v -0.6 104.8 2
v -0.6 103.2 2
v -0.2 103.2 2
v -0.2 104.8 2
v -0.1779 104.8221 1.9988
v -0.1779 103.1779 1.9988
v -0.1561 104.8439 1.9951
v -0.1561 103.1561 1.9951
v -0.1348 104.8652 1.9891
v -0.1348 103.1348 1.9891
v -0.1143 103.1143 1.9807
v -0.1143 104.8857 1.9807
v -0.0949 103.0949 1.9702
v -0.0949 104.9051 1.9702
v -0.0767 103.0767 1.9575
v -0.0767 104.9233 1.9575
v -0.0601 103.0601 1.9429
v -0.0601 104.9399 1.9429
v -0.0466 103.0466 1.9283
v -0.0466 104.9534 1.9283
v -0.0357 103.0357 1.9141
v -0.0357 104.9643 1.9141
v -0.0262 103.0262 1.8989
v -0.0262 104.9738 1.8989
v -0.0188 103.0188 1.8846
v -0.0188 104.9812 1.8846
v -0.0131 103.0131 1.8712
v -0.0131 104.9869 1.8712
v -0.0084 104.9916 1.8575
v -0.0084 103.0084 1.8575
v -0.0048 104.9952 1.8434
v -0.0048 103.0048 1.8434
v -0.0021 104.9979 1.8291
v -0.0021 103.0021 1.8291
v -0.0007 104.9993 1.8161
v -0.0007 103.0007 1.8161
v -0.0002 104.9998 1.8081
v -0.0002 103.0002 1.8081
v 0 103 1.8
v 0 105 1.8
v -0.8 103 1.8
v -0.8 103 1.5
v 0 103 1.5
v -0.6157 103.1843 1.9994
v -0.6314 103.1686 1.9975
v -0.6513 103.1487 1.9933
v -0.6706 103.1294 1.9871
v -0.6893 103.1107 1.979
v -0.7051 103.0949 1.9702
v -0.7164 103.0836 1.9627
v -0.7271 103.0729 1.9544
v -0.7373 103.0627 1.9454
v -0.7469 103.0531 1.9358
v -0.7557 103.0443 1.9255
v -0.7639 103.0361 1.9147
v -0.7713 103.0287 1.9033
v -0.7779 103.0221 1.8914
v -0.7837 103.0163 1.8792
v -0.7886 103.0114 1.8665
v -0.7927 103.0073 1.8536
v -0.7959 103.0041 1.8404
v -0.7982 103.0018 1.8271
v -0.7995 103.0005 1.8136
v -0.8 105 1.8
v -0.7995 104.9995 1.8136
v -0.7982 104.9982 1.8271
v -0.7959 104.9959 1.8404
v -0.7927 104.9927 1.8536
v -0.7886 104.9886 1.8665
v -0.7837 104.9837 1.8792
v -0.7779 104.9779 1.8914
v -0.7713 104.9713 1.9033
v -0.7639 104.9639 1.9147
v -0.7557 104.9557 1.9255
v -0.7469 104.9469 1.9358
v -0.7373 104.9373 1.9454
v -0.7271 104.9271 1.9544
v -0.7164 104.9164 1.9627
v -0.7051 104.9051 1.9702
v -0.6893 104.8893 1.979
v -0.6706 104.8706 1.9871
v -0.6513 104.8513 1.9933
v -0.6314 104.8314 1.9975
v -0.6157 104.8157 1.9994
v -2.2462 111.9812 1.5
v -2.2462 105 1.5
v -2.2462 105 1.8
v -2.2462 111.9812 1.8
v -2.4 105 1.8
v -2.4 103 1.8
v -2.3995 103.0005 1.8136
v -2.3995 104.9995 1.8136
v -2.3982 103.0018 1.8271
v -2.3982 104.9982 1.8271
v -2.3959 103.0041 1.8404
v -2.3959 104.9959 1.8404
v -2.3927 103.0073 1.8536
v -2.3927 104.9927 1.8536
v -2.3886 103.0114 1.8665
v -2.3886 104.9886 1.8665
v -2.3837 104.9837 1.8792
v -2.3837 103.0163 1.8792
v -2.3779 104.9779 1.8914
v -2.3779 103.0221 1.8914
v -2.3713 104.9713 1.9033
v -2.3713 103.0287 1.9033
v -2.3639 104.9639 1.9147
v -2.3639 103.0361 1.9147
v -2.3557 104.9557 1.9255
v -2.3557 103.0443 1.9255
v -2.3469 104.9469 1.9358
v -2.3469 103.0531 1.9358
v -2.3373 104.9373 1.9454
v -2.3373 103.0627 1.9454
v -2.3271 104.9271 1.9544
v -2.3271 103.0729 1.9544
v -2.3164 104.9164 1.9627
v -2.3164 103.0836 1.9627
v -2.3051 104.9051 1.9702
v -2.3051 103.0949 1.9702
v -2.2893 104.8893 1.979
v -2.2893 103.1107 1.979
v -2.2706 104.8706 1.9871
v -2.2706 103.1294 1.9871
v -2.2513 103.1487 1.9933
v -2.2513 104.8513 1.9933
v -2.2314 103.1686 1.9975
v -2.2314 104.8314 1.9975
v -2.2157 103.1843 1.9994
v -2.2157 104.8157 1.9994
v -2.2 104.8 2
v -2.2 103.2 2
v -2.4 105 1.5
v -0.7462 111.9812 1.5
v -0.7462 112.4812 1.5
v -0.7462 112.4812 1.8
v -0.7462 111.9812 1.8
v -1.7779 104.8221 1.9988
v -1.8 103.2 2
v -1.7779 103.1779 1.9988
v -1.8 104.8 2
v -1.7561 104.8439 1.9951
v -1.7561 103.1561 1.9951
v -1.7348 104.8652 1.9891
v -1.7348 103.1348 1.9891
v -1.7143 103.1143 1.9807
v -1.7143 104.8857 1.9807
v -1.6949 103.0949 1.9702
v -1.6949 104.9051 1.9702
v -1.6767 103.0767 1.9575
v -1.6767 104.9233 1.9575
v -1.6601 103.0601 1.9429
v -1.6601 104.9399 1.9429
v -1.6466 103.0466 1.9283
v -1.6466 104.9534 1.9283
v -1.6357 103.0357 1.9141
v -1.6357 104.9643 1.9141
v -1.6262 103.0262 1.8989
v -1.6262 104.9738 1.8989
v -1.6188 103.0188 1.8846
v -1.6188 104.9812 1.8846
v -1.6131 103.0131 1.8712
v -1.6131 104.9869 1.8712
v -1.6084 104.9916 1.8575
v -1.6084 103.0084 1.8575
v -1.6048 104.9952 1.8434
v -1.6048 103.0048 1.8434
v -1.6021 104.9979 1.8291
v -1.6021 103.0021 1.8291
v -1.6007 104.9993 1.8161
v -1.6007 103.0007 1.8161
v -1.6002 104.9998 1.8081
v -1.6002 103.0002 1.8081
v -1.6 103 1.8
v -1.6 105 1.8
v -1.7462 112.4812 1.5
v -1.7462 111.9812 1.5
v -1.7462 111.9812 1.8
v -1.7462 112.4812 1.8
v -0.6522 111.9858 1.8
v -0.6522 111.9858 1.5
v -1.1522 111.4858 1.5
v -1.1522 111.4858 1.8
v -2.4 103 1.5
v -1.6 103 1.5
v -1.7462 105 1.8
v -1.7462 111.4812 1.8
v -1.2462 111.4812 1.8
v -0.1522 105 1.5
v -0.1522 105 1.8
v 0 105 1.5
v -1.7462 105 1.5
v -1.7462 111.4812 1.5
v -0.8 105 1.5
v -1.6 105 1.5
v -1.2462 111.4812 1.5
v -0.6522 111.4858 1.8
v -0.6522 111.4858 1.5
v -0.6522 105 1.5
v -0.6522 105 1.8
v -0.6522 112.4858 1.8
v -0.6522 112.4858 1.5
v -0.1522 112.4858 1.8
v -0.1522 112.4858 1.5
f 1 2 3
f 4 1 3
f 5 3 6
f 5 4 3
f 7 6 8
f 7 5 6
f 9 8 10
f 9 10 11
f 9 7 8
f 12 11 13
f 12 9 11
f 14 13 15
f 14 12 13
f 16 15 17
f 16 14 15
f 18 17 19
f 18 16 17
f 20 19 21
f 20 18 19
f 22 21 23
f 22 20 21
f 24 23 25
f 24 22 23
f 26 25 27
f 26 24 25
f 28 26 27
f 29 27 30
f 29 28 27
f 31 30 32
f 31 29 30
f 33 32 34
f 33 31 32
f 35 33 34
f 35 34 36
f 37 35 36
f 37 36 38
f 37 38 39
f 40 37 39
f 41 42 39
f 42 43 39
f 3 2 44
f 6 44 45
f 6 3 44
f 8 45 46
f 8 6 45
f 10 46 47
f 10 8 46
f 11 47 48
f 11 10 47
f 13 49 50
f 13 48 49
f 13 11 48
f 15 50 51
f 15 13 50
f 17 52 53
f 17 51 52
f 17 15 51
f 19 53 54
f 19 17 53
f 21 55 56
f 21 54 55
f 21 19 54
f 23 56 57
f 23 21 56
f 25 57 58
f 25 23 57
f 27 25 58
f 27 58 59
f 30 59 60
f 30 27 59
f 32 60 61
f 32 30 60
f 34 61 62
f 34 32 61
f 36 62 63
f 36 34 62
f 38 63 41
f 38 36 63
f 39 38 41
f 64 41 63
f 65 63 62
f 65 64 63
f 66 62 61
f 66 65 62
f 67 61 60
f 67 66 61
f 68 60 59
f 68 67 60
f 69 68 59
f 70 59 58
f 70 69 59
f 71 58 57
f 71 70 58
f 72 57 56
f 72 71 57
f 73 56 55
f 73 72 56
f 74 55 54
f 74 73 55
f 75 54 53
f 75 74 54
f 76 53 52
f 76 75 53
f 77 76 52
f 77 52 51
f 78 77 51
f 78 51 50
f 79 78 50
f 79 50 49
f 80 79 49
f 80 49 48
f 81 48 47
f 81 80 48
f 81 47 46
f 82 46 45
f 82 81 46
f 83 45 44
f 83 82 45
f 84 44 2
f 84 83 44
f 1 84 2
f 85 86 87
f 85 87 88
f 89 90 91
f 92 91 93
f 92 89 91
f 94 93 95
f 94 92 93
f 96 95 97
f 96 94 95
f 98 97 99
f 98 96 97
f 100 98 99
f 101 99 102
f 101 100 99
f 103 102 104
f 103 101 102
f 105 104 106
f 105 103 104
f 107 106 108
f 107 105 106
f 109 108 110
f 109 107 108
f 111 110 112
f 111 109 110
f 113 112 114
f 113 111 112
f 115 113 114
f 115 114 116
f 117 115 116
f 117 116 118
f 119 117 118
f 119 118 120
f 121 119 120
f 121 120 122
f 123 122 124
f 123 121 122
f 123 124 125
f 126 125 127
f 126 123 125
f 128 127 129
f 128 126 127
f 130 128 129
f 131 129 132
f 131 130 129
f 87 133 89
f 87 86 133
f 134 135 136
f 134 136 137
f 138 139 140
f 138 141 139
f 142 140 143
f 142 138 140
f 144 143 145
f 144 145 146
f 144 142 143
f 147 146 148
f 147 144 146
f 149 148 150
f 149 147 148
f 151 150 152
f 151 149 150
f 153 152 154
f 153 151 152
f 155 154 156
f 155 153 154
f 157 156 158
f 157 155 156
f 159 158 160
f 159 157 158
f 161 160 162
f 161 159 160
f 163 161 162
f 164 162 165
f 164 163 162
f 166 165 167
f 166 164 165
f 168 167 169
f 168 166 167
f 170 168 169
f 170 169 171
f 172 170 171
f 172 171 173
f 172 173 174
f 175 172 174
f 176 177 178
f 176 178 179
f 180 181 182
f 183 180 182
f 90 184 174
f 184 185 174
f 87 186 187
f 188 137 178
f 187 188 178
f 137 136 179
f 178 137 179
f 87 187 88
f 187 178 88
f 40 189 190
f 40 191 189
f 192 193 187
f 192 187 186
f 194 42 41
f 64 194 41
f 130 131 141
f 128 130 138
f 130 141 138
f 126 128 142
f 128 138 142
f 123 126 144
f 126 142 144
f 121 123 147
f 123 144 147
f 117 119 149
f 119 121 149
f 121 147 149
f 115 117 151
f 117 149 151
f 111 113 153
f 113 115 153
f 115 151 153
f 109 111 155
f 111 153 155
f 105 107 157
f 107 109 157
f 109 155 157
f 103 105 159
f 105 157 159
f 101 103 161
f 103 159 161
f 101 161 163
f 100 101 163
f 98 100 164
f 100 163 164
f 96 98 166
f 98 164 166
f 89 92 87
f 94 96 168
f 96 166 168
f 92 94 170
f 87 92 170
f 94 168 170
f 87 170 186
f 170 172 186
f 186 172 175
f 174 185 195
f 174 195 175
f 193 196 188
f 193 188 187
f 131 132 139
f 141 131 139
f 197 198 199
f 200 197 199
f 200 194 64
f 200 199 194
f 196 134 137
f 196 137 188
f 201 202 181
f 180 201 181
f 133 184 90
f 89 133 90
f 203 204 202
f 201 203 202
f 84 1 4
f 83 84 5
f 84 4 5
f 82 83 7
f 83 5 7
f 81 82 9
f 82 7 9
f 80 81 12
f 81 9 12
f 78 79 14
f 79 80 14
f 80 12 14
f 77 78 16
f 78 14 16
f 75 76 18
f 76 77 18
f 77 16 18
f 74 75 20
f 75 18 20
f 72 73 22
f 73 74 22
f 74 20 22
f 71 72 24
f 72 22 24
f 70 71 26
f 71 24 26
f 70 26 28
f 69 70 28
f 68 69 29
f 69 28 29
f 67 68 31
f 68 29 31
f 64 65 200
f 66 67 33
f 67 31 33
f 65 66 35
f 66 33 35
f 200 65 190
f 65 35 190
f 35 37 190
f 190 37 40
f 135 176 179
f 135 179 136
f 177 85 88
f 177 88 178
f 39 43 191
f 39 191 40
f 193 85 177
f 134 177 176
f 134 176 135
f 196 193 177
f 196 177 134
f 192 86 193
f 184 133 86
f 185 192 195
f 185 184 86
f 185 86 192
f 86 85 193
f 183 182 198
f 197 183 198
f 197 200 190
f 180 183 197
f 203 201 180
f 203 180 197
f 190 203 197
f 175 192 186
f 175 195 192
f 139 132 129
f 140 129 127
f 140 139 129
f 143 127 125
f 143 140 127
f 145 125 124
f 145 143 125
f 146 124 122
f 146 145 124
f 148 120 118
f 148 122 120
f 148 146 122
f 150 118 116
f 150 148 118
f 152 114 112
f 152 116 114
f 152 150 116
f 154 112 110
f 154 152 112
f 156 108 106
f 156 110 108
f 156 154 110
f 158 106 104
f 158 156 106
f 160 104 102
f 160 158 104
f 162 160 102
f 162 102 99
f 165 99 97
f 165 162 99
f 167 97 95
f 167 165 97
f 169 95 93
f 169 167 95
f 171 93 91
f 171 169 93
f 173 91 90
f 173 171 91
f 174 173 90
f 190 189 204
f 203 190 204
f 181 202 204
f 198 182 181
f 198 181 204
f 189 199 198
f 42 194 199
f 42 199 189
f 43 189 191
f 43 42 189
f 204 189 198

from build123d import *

# Parameters (mm, degrees)
BOX002_W                  = 0.5
BOX002_H                  = 0.8
BOX002_DEPTH              = 2
FILLET001_R               = 0.2
FILLET001_PITCH_ANGLE     = -90
FILLET001_PLACEMENT_ANGLE = -90
PAD003_DEPTH              = 0.3
PAD002_DEPTH              = 0.3
FUSION001_PITCH_ANGLE     = -90
FUSION001_PLACEMENT_ANGLE = -90
BOX003_W                  = 0.5
BOX003_H                  = 0.8
BOX003_DEPTH              = 2
FILLET002_R               = 0.2
FILLET002_PITCH_ANGLE     = -90
FILLET002_PLACEMENT_ANGLE = -90


with BuildPart() as soldadura01:
    # Box002 → Box002 (new body)
    with BuildSketch(Plane(origin=(5.9, 1.6, -6), x_dir=(1, 0, 0), z_dir=(0, 0, 1))):
        with Locations((0.25, 0.4)):
            Rectangle(BOX002_W, BOX002_H)
    extrude(amount=BOX002_DEPTH)

    # Fillet001
    fillet001_edges = [soldadura01.edges().sort_by_distance(p)[0] for p in [
        (6.4, 1.6, -5),
        (6.4, 2, -4),
        (6.4, 2.4, -5),
        (6.4, 2, -6),
    ]]
    fillet(fillet001_edges, radius=FILLET001_R)


with BuildPart() as soldadura01_1:
    # Fillet001 pitch: moved
    add(soldadura01.part.rotate(Axis((0, 0, 0), (0, 1, 0)), FILLET001_PITCH_ANGLE))


with BuildPart() as soldadura01_2:
    # Fillet001 placement: moved
    add(soldadura01_1.part.moved(Location((-4, 109, -4.4))).rotate(Axis((-4, 109, -4.4), (0, 0, 1)), FILLET001_PLACEMENT_ANGLE))


with BuildPart() as catodo:
    # Sketch002 → Pad003 (new body)
    with BuildSketch(Plane.YZ):
        Polygon((8.053803, -5.518828), (8.053803, 2.981172), (8.553803, 2.981172), (8.553803, 3.481172), (9.553803, 3.481172), (9.553803, 2.981172), (9.053803, 2.481172), (8.553803, 2.481172), (8.553803, -5.518828), align=None)
    extrude(amount=PAD003_DEPTH)


with BuildPart() as fusion006:
    # Sketch001 → Pad002 (new body)
    with BuildSketch(Plane.YZ):
        Polygon((9.647847, -5.514197), (10.147847, -5.514197), (10.147847, 3.485803), (9.647847, 3.485803), (9.647847, 2.985803), (9.147847, 2.485803), (9.647847, 2.485803), align=None)
    extrude(amount=PAD002_DEPTH)

    # Fusion001: union catodo
    add(catodo.part)


with BuildPart() as fusion006_1:
    # Fusion001 pitch: moved
    add(fusion006.part.rotate(Axis((0, 0, 0), (0, 1, 0)), FUSION001_PITCH_ANGLE))


with BuildPart() as fusion006_2:
    # Fusion001 placement: moved
    add(fusion006_1.part.moved(Location((-10.3, 109, 1.5))).rotate(Axis((-10.3, 109, 1.5), (0, 0, 1)), FUSION001_PLACEMENT_ANGLE))

    # Fusion006: union Soldadura01
    add(soldadura01_2.part)


with BuildPart() as led:
    # Box003 → Box003 (new body)
    with BuildSketch(Plane(origin=(5.9, 3.2, -6), x_dir=(1, 0, 0), z_dir=(0, 0, 1))):
        with Locations((0.25, 0.4)):
            Rectangle(BOX003_W, BOX003_H)
    extrude(amount=BOX003_DEPTH)

    # Fillet002
    fillet002_edges = [led.edges().sort_by_distance(p)[0] for p in [
        (6.4, 3.2, -5),
        (6.4, 3.6, -4),
        (6.4, 4, -5),
        (6.4, 3.6, -6),
    ]]
    fillet(fillet002_edges, radius=FILLET002_R)


with BuildPart() as led_1:
    # Fillet002 pitch: moved
    add(led.part.rotate(Axis((0, 0, 0), (0, 1, 0)), FILLET002_PITCH_ANGLE))


with BuildPart() as led_2:
    # Fillet002 placement: moved
    add(led_1.part.moved(Location((-4, 109, -4.4))).rotate(Axis((-4, 109, -4.4), (0, 0, 1)), FILLET002_PLACEMENT_ANGLE))

    # Fusion007: union Fusion006
    add(fusion006_2.part)


solid = led_2.part
